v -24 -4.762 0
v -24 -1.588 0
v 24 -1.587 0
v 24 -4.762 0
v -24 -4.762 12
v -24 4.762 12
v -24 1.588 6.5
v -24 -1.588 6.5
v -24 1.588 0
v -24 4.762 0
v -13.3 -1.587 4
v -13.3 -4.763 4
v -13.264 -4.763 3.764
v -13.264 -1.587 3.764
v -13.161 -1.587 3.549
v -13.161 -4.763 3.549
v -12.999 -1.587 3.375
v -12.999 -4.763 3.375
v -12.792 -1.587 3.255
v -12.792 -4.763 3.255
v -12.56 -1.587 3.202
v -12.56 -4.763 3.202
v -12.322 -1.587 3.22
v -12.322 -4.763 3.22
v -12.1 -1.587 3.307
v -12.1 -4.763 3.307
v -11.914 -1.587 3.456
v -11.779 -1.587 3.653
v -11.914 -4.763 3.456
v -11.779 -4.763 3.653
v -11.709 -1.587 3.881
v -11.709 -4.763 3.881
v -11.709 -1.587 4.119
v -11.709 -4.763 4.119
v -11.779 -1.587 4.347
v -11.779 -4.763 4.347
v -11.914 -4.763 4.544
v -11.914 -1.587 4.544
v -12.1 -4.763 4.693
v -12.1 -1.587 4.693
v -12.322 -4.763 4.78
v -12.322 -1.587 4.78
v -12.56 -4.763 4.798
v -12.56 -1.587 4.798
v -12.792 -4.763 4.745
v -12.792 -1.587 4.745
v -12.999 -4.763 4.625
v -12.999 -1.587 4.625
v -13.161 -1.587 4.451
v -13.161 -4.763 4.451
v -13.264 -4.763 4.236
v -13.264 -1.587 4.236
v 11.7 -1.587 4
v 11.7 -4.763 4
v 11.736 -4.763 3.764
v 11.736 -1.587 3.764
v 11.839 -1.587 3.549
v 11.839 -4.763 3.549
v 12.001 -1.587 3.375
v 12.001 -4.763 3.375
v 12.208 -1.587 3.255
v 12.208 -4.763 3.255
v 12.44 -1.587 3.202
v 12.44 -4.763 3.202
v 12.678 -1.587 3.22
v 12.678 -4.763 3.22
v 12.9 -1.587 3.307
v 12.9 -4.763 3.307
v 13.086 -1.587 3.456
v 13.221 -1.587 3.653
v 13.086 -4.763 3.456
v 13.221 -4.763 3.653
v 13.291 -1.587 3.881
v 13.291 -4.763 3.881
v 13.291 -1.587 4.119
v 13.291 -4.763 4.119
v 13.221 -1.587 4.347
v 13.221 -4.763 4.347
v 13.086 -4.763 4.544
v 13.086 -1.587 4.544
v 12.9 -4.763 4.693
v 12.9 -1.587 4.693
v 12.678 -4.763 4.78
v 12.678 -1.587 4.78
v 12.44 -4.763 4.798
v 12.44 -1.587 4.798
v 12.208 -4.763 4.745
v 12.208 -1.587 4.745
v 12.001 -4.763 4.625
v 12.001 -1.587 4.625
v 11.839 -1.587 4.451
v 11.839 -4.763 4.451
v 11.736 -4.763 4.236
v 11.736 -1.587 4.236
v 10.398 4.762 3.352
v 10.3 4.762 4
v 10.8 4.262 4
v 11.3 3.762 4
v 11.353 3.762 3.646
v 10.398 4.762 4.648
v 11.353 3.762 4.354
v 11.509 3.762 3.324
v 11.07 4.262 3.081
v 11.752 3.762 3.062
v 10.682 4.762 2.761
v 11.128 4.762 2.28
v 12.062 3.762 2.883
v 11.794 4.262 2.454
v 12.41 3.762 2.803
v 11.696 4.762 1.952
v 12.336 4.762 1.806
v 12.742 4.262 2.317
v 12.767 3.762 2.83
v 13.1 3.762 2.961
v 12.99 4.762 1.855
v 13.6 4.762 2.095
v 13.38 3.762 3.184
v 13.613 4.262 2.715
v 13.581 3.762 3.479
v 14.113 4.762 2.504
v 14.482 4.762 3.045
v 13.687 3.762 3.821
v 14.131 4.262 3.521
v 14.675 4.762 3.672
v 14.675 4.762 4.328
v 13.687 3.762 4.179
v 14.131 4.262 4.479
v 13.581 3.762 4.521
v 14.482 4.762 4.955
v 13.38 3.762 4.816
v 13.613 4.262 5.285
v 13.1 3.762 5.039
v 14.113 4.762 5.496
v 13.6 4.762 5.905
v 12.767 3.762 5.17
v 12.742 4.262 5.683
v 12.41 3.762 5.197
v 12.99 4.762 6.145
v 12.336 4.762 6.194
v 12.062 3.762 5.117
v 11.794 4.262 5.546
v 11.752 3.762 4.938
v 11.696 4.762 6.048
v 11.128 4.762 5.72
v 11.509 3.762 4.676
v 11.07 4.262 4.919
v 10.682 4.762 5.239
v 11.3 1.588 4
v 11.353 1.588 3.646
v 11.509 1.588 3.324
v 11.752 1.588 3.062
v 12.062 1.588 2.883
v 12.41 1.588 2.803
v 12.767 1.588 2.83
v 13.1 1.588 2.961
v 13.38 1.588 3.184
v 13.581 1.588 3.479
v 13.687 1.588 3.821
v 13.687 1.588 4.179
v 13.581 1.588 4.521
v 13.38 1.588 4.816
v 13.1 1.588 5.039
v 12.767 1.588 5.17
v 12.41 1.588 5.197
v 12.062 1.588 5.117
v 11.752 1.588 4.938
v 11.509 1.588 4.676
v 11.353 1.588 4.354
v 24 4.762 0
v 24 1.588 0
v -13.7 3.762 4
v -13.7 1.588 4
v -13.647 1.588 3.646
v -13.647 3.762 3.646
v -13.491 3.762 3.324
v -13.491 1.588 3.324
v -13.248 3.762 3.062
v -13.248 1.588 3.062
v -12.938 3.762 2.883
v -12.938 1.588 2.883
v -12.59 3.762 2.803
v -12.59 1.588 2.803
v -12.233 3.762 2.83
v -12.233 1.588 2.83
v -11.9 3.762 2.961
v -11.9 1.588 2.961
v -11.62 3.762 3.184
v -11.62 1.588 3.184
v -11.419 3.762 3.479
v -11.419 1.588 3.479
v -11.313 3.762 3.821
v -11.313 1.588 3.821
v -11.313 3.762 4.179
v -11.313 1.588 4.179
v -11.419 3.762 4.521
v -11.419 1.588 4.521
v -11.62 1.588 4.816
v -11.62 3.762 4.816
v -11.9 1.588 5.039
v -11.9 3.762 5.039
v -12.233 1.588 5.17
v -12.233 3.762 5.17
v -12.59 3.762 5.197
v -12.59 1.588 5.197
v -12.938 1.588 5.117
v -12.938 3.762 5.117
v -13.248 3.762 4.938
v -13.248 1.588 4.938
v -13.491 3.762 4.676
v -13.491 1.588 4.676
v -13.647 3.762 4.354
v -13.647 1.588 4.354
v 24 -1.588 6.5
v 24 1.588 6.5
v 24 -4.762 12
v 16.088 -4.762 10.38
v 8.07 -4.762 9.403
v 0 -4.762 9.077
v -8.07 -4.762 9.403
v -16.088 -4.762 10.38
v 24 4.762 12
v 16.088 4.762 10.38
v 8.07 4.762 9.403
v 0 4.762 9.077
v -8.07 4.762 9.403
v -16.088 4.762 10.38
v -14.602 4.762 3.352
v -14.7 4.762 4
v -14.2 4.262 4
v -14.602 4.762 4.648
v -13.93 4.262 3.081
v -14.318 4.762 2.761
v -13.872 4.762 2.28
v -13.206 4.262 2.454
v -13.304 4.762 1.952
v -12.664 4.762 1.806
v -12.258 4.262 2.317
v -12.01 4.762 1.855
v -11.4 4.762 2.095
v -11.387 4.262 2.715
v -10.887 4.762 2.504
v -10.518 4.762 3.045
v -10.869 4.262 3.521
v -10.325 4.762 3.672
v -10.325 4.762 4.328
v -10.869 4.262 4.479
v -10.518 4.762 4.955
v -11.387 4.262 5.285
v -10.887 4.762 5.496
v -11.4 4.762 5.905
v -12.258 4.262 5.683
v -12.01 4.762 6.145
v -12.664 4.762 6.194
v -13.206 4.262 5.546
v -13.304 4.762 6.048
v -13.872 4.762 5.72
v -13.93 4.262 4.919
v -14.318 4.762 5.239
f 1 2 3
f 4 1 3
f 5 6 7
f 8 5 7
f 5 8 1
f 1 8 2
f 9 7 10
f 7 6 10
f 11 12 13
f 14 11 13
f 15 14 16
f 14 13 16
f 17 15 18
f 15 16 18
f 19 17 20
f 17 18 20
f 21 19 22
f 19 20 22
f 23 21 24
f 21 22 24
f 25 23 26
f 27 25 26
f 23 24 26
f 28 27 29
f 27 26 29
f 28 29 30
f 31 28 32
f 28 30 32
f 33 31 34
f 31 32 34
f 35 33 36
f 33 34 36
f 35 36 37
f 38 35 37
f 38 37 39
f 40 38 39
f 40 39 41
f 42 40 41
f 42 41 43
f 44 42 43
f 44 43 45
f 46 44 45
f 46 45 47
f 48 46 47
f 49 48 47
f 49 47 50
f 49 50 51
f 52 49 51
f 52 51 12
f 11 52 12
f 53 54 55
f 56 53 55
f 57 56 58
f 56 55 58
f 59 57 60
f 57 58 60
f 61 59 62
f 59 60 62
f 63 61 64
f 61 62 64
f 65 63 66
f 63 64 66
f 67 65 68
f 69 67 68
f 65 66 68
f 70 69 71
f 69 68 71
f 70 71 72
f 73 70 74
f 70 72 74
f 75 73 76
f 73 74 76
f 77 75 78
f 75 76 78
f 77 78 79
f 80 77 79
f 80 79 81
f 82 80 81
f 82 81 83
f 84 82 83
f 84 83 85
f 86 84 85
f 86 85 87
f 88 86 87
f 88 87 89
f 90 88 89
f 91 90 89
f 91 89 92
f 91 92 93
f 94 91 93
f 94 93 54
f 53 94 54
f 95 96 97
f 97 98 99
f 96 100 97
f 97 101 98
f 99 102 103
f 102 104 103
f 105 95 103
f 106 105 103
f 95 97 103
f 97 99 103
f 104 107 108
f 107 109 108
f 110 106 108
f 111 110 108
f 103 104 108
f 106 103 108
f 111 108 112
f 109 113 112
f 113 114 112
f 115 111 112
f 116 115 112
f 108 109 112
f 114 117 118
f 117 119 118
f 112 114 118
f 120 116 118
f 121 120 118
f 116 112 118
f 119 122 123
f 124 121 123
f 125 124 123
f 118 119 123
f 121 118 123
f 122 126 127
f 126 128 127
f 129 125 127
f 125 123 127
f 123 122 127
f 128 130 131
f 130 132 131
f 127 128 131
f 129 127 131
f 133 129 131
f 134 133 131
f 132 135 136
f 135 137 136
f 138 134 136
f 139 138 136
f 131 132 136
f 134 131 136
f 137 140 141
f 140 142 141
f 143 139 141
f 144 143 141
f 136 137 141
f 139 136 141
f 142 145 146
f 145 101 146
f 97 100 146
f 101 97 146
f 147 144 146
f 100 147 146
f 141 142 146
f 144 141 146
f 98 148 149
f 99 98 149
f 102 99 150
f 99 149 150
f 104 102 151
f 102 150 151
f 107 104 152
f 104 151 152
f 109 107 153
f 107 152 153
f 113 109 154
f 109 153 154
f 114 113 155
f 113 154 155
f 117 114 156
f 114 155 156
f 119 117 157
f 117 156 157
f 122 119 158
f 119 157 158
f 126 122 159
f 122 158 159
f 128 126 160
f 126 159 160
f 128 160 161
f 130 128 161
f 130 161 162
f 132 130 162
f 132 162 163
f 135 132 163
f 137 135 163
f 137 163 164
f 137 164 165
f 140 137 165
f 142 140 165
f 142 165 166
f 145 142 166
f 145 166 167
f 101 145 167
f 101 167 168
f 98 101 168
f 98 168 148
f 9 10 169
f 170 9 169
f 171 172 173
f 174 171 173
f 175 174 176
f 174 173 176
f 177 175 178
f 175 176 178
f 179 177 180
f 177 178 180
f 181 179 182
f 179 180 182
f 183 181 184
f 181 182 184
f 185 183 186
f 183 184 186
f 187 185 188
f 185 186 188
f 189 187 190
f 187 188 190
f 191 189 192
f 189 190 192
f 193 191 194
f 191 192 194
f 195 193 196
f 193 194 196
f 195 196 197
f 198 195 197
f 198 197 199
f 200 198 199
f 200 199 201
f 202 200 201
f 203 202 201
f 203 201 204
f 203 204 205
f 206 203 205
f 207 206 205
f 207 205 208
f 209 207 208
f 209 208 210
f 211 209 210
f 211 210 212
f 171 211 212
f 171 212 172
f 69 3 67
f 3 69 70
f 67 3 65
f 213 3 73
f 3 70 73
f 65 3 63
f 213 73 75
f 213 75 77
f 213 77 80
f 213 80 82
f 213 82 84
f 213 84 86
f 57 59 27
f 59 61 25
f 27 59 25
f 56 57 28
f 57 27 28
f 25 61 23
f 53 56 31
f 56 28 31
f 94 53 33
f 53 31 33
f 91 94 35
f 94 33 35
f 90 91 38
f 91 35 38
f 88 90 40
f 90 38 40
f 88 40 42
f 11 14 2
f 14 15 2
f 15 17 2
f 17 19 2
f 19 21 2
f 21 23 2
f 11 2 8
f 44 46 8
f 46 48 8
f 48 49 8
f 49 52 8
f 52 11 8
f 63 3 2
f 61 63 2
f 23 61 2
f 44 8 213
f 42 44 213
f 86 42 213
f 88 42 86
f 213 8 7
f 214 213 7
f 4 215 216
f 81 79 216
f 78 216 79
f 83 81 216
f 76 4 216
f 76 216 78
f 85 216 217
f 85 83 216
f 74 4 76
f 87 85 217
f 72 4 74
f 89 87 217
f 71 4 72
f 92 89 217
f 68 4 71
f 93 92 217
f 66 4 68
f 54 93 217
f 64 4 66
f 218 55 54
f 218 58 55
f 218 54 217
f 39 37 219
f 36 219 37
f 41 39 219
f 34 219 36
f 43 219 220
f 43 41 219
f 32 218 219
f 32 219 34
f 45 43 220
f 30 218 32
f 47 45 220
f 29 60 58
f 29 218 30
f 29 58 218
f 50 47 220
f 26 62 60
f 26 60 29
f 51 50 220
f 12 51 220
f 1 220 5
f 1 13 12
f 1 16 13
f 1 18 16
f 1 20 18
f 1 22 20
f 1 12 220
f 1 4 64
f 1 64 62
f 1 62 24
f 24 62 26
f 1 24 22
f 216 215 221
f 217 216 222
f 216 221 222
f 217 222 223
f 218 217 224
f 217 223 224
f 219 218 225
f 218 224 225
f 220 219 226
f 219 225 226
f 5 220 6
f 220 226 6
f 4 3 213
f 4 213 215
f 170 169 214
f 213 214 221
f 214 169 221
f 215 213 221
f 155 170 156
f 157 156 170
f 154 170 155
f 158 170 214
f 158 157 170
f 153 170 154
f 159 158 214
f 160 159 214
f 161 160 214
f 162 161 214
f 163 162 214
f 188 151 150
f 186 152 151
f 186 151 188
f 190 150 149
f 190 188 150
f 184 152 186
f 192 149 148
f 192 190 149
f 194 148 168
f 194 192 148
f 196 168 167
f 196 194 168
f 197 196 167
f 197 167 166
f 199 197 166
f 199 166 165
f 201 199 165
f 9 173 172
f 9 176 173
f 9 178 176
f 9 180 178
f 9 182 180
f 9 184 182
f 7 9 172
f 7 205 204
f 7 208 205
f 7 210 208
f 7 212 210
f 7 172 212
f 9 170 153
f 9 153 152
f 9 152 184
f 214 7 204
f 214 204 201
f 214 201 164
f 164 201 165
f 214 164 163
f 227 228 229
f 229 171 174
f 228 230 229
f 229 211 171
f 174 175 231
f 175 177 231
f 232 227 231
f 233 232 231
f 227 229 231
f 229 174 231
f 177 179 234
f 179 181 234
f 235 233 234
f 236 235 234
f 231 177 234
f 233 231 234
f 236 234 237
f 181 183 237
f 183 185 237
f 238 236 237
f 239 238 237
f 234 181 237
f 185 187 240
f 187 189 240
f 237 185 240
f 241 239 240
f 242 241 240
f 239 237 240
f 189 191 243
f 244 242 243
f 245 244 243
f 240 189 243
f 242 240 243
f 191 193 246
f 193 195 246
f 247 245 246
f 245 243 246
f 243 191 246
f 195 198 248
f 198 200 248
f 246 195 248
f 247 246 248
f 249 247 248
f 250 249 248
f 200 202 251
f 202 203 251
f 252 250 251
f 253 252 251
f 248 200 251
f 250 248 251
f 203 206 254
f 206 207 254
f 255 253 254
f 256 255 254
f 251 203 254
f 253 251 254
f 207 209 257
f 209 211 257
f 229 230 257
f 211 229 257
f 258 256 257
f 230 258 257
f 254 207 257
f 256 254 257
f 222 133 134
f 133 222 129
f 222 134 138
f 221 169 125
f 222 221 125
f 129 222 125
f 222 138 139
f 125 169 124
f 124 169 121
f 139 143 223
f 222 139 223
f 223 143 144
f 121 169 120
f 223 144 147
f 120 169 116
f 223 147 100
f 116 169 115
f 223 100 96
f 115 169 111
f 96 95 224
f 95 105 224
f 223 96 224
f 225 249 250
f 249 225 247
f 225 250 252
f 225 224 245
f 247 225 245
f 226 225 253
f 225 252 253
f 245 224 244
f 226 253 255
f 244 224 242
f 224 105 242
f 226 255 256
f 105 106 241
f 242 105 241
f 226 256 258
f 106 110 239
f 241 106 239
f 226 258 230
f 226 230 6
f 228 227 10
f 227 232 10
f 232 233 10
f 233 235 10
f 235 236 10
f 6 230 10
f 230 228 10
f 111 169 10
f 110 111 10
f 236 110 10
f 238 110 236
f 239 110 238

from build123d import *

# Parameters (mm, degrees)
BOSS_EXTRUDE1_DEPTH                             = 4.7625
SKETCH9_W                                       = 6.5
SKETCH9_H                                       = 3.175
CUT_EXTRUDE2_DEPTH                              = 50.705949405
CSK_FOR_M2_FLAT_HEAD_MACHINE_SCREW1_D           = 2.4
CSK_FOR_M2_FLAT_HEAD_MACHINE_SCREW1_DEPTH       = 3.175
CSK_FOR_M2_FLAT_HEAD_MACHINE_SCREW1_CSINK_D     = 4.4
CSK_FOR_M2_FLAT_HEAD_MACHINE_SCREW1_CSINK_ANGLE = 90
M2X0_4_TAPPED_HOLE1_D                           = 1.6


with BuildPart() as part:
    # Sketch1 → Boss-Extrude1 (new, symmetric)
    with BuildSketch(Plane(origin=(0, 0, 0), x_dir=(1, 0, 0), z_dir=(0, 1, 0))):
        with BuildLine():
            Line((-24, 0), (24, 0))
            Line((24, 0), (24, -12))
            ThreePointArc((24, -12), (0, -9.077288796), (-24, -12))
            Line((-24, -12), (-24, 0))
        make_face()
    extrude(amount=BOSS_EXTRUDE1_DEPTH, both=True)

    # Sketch9 → Cut-Extrude2 (cut, through all)
    with BuildSketch(Plane.ZY.offset(24)):
        with Locations((3.25, 0)):
            Rectangle(SKETCH9_W, SKETCH9_H)
    extrude(amount=-CUT_EXTRUDE2_DEPTH, mode=Mode.SUBTRACT)

    # CSK for M2 Flat Head Machine Screw1
    with Locations(Plane(origin=(0, 4.7625, 0), x_dir=(1, 0, 0), z_dir=(0, 1, 0))):
        with Locations((-12.5, -4), (12.5, -4)):
            CounterSinkHole(CSK_FOR_M2_FLAT_HEAD_MACHINE_SCREW1_D / 2, CSK_FOR_M2_FLAT_HEAD_MACHINE_SCREW1_CSINK_D / 2, depth=CSK_FOR_M2_FLAT_HEAD_MACHINE_SCREW1_DEPTH, counter_sink_angle=CSK_FOR_M2_FLAT_HEAD_MACHINE_SCREW1_CSINK_ANGLE)

    # M2x0.4 Tapped Hole1 (through all)
    with Locations(Plane(origin=(0, -1.5875, 0), x_dir=(1, 0, 0), z_dir=(0, 1, 0))):
        with Locations((-12.5, -4), (12.5, -4)):
            Hole(M2X0_4_TAPPED_HOLE1_D / 2)


solid = part.part
